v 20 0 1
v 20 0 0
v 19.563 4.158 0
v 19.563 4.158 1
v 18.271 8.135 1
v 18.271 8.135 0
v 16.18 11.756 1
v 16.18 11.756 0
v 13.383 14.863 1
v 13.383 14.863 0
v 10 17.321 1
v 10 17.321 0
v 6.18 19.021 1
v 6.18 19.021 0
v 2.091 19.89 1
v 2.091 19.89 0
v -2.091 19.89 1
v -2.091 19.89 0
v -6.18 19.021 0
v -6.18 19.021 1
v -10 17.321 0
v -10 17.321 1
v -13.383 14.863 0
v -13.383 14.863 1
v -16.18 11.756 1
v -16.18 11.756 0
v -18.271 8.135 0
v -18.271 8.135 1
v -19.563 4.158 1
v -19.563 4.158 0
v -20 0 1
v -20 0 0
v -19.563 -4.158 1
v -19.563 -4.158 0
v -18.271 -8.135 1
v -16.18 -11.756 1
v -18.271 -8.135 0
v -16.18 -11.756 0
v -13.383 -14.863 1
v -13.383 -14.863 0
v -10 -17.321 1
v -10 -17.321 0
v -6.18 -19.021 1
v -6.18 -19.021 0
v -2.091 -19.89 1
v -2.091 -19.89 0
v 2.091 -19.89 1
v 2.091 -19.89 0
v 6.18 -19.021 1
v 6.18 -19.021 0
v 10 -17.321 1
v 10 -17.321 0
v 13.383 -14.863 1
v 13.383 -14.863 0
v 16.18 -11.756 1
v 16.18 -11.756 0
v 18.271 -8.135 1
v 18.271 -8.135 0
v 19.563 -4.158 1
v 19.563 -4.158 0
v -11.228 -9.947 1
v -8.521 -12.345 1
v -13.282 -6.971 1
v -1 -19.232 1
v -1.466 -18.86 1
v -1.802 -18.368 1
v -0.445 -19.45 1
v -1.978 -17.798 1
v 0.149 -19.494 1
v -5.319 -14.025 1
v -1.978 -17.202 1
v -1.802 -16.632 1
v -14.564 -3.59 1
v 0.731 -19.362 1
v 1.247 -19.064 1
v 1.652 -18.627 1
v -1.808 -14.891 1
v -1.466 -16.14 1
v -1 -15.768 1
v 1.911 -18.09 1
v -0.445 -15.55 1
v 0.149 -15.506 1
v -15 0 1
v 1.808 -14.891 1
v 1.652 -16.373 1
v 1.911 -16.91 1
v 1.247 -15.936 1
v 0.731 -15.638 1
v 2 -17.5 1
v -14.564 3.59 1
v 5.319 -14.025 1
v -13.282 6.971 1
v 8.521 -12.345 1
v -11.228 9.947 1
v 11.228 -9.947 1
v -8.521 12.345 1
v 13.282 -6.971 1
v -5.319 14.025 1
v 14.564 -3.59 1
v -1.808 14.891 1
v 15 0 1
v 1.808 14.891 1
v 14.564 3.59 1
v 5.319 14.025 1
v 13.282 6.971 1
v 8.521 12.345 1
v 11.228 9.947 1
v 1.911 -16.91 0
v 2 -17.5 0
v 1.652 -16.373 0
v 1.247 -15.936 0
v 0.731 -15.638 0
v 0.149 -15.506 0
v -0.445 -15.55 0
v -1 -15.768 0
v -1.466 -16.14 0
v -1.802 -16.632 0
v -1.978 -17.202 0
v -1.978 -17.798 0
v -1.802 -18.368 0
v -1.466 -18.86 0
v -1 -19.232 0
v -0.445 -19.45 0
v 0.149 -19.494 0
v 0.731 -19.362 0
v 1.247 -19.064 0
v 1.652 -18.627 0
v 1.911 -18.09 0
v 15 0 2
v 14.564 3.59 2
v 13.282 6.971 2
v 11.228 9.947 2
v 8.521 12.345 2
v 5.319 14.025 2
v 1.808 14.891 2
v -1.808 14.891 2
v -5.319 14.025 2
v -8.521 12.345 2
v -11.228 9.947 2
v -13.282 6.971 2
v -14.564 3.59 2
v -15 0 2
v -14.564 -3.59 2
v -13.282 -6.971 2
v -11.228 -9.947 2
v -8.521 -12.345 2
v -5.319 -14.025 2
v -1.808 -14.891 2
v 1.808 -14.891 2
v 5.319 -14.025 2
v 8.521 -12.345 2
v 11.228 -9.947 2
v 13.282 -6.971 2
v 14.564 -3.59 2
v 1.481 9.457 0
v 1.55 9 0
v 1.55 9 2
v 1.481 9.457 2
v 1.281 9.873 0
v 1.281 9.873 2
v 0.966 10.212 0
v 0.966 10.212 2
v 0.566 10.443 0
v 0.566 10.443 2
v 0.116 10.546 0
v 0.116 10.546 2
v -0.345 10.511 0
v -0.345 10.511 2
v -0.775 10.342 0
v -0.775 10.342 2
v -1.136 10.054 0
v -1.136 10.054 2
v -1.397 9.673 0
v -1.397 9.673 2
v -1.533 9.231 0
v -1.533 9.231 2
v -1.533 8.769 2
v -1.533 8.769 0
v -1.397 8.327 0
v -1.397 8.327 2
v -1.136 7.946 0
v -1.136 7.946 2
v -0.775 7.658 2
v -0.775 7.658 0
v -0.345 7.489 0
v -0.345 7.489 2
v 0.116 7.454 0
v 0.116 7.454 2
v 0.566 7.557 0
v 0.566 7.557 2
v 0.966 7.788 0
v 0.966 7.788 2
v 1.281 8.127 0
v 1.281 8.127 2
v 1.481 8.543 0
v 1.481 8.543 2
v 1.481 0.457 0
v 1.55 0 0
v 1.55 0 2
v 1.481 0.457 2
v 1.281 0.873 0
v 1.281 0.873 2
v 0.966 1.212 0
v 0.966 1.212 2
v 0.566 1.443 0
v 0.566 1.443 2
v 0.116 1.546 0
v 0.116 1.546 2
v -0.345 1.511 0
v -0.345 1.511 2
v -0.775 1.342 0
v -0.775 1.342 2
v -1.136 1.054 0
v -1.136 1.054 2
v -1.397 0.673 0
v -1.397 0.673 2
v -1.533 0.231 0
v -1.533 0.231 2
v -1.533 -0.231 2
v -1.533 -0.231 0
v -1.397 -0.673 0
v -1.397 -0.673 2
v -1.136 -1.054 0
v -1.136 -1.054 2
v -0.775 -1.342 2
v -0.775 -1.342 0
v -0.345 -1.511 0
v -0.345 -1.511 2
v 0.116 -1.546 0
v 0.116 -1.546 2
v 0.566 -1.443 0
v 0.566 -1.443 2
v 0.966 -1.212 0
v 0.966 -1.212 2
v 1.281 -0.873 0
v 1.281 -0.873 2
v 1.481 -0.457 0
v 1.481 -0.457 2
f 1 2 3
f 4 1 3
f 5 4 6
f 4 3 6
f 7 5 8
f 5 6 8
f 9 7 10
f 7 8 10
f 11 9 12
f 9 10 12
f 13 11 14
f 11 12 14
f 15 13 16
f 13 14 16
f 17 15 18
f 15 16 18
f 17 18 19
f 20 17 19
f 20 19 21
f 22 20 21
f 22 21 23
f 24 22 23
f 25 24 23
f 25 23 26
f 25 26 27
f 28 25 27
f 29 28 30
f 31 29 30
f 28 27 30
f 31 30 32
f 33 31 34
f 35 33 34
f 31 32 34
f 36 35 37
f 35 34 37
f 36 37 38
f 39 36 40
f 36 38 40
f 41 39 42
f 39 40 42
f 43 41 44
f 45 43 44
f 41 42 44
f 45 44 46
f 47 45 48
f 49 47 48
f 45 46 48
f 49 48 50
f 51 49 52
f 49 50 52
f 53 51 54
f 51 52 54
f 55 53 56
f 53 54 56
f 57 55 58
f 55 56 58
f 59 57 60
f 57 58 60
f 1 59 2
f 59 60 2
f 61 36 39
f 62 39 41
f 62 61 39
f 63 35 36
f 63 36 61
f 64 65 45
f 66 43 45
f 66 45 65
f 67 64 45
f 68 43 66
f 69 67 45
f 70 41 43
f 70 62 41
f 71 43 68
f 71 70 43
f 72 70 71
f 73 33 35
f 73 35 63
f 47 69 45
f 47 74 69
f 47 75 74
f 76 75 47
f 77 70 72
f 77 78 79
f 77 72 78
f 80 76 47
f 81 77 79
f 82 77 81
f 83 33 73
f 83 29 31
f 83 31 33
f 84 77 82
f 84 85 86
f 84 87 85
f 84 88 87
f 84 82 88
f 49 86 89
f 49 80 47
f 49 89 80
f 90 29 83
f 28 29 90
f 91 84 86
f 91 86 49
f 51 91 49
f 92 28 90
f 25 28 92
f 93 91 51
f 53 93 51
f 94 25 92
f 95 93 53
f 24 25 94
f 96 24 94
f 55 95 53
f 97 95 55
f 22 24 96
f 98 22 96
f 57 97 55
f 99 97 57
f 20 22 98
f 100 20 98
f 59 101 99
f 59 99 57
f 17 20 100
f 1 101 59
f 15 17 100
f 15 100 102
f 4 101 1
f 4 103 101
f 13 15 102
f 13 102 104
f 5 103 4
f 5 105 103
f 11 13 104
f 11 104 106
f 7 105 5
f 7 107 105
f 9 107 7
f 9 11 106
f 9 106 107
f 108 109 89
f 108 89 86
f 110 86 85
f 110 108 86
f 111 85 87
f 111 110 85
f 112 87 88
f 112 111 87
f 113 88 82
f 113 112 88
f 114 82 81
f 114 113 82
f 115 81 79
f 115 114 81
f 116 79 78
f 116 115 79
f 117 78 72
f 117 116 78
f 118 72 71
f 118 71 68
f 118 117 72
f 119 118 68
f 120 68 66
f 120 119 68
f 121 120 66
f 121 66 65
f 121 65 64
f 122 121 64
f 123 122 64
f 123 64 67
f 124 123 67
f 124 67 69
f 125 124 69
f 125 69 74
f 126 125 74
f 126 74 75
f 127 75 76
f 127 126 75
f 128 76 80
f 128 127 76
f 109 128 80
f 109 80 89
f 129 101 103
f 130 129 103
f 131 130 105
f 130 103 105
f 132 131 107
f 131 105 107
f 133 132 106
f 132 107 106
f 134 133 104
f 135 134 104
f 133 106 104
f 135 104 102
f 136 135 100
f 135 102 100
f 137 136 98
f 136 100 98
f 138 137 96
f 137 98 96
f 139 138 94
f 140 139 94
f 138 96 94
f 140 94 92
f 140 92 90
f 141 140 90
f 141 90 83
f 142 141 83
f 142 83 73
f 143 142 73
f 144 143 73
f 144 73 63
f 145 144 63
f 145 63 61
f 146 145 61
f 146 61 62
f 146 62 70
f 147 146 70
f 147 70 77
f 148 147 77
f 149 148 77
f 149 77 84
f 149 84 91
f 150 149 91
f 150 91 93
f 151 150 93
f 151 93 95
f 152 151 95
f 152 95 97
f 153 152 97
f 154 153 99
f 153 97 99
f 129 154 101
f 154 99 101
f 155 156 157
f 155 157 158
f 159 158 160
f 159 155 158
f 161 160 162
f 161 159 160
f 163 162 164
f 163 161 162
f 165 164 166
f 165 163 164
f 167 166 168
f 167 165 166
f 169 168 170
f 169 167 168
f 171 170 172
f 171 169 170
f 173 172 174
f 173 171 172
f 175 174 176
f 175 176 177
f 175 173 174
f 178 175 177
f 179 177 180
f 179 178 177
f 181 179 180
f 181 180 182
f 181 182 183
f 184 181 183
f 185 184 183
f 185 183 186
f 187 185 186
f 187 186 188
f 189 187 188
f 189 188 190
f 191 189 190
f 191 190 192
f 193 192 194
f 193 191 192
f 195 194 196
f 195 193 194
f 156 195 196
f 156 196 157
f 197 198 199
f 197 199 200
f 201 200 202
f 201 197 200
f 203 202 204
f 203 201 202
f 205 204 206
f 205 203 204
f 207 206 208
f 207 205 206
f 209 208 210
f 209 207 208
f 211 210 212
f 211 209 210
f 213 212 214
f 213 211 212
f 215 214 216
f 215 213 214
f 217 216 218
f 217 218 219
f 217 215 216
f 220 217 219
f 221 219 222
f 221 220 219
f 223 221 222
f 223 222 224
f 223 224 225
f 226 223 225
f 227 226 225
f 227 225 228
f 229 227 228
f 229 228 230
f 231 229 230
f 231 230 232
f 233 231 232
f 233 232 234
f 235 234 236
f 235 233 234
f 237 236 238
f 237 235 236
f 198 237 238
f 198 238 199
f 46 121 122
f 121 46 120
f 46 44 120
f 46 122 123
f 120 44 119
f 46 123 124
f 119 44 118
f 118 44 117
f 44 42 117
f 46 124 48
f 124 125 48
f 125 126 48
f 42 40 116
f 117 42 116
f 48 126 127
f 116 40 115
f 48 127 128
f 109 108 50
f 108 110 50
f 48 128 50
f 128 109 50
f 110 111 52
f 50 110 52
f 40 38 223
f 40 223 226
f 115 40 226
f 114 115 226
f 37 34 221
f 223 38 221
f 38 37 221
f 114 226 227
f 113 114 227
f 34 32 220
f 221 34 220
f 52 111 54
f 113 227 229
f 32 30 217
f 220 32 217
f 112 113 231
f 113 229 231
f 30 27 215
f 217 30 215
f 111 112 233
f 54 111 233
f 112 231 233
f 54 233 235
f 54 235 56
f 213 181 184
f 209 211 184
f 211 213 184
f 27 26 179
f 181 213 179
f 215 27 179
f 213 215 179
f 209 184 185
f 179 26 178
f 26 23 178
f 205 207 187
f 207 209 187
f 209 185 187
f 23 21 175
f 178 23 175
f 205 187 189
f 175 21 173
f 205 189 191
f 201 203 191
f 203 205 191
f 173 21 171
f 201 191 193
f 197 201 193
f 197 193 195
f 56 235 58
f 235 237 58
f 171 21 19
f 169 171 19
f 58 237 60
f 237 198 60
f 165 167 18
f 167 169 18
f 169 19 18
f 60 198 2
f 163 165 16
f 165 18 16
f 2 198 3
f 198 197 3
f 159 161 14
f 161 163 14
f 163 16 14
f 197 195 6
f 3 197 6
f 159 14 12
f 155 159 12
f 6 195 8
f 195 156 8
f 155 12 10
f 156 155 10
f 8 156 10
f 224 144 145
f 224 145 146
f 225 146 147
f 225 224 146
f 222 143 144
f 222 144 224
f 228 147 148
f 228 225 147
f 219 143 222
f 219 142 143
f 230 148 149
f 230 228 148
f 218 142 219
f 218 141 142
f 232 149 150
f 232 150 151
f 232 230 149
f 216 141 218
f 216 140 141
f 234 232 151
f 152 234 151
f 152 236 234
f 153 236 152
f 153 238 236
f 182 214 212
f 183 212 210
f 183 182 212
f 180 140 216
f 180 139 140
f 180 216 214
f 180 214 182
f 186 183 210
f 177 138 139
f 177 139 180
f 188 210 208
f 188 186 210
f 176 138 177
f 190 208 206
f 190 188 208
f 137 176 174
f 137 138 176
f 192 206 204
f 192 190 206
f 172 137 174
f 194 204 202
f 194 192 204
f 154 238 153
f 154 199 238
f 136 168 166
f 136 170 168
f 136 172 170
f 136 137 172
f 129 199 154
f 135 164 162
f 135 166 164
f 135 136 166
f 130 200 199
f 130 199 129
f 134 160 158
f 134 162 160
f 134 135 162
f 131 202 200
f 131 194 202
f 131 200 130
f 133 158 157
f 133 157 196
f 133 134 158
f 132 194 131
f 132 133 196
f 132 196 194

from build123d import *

# Parameters (mm, degrees)
SKETCH1_R           = 20
SKETCH1_R_2         = 2
SKETCH1_R_3         = 15
BOSS_EXTRUDE1_DEPTH = 1
SKETCH1_4_R         = 15
SKETCH1_4_R_2       = 1.55
BOSS_EXTRUDE2_DEPTH = 2


with BuildPart() as part:
    # Sketch1 → Boss-Extrude1 (new body)
    with BuildSketch(Plane(origin=(0, 0, 0), x_dir=(0, 1, 0), z_dir=(0, 0, 1))):
        Circle(SKETCH1_R)
        with Locations((-17.5, 0)):
            Circle(SKETCH1_R_2, mode=Mode.SUBTRACT)
        Circle(SKETCH1_R_3, mode=Mode.SUBTRACT)
    extrude(amount=BOSS_EXTRUDE1_DEPTH)

    # Sketch1<4> → Boss-Extrude2 (add)
    with BuildSketch(Plane(origin=(0, 0, 0), x_dir=(0, 1, 0), z_dir=(0, 0, 1))):
        Circle(SKETCH1_4_R)
        Circle(SKETCH1_4_R_2, mode=Mode.SUBTRACT)
        with Locations((9, 0)):
            Circle(SKETCH1_4_R_2, mode=Mode.SUBTRACT)
    extrude(amount=BOSS_EXTRUDE2_DEPTH)


solid = part.part
